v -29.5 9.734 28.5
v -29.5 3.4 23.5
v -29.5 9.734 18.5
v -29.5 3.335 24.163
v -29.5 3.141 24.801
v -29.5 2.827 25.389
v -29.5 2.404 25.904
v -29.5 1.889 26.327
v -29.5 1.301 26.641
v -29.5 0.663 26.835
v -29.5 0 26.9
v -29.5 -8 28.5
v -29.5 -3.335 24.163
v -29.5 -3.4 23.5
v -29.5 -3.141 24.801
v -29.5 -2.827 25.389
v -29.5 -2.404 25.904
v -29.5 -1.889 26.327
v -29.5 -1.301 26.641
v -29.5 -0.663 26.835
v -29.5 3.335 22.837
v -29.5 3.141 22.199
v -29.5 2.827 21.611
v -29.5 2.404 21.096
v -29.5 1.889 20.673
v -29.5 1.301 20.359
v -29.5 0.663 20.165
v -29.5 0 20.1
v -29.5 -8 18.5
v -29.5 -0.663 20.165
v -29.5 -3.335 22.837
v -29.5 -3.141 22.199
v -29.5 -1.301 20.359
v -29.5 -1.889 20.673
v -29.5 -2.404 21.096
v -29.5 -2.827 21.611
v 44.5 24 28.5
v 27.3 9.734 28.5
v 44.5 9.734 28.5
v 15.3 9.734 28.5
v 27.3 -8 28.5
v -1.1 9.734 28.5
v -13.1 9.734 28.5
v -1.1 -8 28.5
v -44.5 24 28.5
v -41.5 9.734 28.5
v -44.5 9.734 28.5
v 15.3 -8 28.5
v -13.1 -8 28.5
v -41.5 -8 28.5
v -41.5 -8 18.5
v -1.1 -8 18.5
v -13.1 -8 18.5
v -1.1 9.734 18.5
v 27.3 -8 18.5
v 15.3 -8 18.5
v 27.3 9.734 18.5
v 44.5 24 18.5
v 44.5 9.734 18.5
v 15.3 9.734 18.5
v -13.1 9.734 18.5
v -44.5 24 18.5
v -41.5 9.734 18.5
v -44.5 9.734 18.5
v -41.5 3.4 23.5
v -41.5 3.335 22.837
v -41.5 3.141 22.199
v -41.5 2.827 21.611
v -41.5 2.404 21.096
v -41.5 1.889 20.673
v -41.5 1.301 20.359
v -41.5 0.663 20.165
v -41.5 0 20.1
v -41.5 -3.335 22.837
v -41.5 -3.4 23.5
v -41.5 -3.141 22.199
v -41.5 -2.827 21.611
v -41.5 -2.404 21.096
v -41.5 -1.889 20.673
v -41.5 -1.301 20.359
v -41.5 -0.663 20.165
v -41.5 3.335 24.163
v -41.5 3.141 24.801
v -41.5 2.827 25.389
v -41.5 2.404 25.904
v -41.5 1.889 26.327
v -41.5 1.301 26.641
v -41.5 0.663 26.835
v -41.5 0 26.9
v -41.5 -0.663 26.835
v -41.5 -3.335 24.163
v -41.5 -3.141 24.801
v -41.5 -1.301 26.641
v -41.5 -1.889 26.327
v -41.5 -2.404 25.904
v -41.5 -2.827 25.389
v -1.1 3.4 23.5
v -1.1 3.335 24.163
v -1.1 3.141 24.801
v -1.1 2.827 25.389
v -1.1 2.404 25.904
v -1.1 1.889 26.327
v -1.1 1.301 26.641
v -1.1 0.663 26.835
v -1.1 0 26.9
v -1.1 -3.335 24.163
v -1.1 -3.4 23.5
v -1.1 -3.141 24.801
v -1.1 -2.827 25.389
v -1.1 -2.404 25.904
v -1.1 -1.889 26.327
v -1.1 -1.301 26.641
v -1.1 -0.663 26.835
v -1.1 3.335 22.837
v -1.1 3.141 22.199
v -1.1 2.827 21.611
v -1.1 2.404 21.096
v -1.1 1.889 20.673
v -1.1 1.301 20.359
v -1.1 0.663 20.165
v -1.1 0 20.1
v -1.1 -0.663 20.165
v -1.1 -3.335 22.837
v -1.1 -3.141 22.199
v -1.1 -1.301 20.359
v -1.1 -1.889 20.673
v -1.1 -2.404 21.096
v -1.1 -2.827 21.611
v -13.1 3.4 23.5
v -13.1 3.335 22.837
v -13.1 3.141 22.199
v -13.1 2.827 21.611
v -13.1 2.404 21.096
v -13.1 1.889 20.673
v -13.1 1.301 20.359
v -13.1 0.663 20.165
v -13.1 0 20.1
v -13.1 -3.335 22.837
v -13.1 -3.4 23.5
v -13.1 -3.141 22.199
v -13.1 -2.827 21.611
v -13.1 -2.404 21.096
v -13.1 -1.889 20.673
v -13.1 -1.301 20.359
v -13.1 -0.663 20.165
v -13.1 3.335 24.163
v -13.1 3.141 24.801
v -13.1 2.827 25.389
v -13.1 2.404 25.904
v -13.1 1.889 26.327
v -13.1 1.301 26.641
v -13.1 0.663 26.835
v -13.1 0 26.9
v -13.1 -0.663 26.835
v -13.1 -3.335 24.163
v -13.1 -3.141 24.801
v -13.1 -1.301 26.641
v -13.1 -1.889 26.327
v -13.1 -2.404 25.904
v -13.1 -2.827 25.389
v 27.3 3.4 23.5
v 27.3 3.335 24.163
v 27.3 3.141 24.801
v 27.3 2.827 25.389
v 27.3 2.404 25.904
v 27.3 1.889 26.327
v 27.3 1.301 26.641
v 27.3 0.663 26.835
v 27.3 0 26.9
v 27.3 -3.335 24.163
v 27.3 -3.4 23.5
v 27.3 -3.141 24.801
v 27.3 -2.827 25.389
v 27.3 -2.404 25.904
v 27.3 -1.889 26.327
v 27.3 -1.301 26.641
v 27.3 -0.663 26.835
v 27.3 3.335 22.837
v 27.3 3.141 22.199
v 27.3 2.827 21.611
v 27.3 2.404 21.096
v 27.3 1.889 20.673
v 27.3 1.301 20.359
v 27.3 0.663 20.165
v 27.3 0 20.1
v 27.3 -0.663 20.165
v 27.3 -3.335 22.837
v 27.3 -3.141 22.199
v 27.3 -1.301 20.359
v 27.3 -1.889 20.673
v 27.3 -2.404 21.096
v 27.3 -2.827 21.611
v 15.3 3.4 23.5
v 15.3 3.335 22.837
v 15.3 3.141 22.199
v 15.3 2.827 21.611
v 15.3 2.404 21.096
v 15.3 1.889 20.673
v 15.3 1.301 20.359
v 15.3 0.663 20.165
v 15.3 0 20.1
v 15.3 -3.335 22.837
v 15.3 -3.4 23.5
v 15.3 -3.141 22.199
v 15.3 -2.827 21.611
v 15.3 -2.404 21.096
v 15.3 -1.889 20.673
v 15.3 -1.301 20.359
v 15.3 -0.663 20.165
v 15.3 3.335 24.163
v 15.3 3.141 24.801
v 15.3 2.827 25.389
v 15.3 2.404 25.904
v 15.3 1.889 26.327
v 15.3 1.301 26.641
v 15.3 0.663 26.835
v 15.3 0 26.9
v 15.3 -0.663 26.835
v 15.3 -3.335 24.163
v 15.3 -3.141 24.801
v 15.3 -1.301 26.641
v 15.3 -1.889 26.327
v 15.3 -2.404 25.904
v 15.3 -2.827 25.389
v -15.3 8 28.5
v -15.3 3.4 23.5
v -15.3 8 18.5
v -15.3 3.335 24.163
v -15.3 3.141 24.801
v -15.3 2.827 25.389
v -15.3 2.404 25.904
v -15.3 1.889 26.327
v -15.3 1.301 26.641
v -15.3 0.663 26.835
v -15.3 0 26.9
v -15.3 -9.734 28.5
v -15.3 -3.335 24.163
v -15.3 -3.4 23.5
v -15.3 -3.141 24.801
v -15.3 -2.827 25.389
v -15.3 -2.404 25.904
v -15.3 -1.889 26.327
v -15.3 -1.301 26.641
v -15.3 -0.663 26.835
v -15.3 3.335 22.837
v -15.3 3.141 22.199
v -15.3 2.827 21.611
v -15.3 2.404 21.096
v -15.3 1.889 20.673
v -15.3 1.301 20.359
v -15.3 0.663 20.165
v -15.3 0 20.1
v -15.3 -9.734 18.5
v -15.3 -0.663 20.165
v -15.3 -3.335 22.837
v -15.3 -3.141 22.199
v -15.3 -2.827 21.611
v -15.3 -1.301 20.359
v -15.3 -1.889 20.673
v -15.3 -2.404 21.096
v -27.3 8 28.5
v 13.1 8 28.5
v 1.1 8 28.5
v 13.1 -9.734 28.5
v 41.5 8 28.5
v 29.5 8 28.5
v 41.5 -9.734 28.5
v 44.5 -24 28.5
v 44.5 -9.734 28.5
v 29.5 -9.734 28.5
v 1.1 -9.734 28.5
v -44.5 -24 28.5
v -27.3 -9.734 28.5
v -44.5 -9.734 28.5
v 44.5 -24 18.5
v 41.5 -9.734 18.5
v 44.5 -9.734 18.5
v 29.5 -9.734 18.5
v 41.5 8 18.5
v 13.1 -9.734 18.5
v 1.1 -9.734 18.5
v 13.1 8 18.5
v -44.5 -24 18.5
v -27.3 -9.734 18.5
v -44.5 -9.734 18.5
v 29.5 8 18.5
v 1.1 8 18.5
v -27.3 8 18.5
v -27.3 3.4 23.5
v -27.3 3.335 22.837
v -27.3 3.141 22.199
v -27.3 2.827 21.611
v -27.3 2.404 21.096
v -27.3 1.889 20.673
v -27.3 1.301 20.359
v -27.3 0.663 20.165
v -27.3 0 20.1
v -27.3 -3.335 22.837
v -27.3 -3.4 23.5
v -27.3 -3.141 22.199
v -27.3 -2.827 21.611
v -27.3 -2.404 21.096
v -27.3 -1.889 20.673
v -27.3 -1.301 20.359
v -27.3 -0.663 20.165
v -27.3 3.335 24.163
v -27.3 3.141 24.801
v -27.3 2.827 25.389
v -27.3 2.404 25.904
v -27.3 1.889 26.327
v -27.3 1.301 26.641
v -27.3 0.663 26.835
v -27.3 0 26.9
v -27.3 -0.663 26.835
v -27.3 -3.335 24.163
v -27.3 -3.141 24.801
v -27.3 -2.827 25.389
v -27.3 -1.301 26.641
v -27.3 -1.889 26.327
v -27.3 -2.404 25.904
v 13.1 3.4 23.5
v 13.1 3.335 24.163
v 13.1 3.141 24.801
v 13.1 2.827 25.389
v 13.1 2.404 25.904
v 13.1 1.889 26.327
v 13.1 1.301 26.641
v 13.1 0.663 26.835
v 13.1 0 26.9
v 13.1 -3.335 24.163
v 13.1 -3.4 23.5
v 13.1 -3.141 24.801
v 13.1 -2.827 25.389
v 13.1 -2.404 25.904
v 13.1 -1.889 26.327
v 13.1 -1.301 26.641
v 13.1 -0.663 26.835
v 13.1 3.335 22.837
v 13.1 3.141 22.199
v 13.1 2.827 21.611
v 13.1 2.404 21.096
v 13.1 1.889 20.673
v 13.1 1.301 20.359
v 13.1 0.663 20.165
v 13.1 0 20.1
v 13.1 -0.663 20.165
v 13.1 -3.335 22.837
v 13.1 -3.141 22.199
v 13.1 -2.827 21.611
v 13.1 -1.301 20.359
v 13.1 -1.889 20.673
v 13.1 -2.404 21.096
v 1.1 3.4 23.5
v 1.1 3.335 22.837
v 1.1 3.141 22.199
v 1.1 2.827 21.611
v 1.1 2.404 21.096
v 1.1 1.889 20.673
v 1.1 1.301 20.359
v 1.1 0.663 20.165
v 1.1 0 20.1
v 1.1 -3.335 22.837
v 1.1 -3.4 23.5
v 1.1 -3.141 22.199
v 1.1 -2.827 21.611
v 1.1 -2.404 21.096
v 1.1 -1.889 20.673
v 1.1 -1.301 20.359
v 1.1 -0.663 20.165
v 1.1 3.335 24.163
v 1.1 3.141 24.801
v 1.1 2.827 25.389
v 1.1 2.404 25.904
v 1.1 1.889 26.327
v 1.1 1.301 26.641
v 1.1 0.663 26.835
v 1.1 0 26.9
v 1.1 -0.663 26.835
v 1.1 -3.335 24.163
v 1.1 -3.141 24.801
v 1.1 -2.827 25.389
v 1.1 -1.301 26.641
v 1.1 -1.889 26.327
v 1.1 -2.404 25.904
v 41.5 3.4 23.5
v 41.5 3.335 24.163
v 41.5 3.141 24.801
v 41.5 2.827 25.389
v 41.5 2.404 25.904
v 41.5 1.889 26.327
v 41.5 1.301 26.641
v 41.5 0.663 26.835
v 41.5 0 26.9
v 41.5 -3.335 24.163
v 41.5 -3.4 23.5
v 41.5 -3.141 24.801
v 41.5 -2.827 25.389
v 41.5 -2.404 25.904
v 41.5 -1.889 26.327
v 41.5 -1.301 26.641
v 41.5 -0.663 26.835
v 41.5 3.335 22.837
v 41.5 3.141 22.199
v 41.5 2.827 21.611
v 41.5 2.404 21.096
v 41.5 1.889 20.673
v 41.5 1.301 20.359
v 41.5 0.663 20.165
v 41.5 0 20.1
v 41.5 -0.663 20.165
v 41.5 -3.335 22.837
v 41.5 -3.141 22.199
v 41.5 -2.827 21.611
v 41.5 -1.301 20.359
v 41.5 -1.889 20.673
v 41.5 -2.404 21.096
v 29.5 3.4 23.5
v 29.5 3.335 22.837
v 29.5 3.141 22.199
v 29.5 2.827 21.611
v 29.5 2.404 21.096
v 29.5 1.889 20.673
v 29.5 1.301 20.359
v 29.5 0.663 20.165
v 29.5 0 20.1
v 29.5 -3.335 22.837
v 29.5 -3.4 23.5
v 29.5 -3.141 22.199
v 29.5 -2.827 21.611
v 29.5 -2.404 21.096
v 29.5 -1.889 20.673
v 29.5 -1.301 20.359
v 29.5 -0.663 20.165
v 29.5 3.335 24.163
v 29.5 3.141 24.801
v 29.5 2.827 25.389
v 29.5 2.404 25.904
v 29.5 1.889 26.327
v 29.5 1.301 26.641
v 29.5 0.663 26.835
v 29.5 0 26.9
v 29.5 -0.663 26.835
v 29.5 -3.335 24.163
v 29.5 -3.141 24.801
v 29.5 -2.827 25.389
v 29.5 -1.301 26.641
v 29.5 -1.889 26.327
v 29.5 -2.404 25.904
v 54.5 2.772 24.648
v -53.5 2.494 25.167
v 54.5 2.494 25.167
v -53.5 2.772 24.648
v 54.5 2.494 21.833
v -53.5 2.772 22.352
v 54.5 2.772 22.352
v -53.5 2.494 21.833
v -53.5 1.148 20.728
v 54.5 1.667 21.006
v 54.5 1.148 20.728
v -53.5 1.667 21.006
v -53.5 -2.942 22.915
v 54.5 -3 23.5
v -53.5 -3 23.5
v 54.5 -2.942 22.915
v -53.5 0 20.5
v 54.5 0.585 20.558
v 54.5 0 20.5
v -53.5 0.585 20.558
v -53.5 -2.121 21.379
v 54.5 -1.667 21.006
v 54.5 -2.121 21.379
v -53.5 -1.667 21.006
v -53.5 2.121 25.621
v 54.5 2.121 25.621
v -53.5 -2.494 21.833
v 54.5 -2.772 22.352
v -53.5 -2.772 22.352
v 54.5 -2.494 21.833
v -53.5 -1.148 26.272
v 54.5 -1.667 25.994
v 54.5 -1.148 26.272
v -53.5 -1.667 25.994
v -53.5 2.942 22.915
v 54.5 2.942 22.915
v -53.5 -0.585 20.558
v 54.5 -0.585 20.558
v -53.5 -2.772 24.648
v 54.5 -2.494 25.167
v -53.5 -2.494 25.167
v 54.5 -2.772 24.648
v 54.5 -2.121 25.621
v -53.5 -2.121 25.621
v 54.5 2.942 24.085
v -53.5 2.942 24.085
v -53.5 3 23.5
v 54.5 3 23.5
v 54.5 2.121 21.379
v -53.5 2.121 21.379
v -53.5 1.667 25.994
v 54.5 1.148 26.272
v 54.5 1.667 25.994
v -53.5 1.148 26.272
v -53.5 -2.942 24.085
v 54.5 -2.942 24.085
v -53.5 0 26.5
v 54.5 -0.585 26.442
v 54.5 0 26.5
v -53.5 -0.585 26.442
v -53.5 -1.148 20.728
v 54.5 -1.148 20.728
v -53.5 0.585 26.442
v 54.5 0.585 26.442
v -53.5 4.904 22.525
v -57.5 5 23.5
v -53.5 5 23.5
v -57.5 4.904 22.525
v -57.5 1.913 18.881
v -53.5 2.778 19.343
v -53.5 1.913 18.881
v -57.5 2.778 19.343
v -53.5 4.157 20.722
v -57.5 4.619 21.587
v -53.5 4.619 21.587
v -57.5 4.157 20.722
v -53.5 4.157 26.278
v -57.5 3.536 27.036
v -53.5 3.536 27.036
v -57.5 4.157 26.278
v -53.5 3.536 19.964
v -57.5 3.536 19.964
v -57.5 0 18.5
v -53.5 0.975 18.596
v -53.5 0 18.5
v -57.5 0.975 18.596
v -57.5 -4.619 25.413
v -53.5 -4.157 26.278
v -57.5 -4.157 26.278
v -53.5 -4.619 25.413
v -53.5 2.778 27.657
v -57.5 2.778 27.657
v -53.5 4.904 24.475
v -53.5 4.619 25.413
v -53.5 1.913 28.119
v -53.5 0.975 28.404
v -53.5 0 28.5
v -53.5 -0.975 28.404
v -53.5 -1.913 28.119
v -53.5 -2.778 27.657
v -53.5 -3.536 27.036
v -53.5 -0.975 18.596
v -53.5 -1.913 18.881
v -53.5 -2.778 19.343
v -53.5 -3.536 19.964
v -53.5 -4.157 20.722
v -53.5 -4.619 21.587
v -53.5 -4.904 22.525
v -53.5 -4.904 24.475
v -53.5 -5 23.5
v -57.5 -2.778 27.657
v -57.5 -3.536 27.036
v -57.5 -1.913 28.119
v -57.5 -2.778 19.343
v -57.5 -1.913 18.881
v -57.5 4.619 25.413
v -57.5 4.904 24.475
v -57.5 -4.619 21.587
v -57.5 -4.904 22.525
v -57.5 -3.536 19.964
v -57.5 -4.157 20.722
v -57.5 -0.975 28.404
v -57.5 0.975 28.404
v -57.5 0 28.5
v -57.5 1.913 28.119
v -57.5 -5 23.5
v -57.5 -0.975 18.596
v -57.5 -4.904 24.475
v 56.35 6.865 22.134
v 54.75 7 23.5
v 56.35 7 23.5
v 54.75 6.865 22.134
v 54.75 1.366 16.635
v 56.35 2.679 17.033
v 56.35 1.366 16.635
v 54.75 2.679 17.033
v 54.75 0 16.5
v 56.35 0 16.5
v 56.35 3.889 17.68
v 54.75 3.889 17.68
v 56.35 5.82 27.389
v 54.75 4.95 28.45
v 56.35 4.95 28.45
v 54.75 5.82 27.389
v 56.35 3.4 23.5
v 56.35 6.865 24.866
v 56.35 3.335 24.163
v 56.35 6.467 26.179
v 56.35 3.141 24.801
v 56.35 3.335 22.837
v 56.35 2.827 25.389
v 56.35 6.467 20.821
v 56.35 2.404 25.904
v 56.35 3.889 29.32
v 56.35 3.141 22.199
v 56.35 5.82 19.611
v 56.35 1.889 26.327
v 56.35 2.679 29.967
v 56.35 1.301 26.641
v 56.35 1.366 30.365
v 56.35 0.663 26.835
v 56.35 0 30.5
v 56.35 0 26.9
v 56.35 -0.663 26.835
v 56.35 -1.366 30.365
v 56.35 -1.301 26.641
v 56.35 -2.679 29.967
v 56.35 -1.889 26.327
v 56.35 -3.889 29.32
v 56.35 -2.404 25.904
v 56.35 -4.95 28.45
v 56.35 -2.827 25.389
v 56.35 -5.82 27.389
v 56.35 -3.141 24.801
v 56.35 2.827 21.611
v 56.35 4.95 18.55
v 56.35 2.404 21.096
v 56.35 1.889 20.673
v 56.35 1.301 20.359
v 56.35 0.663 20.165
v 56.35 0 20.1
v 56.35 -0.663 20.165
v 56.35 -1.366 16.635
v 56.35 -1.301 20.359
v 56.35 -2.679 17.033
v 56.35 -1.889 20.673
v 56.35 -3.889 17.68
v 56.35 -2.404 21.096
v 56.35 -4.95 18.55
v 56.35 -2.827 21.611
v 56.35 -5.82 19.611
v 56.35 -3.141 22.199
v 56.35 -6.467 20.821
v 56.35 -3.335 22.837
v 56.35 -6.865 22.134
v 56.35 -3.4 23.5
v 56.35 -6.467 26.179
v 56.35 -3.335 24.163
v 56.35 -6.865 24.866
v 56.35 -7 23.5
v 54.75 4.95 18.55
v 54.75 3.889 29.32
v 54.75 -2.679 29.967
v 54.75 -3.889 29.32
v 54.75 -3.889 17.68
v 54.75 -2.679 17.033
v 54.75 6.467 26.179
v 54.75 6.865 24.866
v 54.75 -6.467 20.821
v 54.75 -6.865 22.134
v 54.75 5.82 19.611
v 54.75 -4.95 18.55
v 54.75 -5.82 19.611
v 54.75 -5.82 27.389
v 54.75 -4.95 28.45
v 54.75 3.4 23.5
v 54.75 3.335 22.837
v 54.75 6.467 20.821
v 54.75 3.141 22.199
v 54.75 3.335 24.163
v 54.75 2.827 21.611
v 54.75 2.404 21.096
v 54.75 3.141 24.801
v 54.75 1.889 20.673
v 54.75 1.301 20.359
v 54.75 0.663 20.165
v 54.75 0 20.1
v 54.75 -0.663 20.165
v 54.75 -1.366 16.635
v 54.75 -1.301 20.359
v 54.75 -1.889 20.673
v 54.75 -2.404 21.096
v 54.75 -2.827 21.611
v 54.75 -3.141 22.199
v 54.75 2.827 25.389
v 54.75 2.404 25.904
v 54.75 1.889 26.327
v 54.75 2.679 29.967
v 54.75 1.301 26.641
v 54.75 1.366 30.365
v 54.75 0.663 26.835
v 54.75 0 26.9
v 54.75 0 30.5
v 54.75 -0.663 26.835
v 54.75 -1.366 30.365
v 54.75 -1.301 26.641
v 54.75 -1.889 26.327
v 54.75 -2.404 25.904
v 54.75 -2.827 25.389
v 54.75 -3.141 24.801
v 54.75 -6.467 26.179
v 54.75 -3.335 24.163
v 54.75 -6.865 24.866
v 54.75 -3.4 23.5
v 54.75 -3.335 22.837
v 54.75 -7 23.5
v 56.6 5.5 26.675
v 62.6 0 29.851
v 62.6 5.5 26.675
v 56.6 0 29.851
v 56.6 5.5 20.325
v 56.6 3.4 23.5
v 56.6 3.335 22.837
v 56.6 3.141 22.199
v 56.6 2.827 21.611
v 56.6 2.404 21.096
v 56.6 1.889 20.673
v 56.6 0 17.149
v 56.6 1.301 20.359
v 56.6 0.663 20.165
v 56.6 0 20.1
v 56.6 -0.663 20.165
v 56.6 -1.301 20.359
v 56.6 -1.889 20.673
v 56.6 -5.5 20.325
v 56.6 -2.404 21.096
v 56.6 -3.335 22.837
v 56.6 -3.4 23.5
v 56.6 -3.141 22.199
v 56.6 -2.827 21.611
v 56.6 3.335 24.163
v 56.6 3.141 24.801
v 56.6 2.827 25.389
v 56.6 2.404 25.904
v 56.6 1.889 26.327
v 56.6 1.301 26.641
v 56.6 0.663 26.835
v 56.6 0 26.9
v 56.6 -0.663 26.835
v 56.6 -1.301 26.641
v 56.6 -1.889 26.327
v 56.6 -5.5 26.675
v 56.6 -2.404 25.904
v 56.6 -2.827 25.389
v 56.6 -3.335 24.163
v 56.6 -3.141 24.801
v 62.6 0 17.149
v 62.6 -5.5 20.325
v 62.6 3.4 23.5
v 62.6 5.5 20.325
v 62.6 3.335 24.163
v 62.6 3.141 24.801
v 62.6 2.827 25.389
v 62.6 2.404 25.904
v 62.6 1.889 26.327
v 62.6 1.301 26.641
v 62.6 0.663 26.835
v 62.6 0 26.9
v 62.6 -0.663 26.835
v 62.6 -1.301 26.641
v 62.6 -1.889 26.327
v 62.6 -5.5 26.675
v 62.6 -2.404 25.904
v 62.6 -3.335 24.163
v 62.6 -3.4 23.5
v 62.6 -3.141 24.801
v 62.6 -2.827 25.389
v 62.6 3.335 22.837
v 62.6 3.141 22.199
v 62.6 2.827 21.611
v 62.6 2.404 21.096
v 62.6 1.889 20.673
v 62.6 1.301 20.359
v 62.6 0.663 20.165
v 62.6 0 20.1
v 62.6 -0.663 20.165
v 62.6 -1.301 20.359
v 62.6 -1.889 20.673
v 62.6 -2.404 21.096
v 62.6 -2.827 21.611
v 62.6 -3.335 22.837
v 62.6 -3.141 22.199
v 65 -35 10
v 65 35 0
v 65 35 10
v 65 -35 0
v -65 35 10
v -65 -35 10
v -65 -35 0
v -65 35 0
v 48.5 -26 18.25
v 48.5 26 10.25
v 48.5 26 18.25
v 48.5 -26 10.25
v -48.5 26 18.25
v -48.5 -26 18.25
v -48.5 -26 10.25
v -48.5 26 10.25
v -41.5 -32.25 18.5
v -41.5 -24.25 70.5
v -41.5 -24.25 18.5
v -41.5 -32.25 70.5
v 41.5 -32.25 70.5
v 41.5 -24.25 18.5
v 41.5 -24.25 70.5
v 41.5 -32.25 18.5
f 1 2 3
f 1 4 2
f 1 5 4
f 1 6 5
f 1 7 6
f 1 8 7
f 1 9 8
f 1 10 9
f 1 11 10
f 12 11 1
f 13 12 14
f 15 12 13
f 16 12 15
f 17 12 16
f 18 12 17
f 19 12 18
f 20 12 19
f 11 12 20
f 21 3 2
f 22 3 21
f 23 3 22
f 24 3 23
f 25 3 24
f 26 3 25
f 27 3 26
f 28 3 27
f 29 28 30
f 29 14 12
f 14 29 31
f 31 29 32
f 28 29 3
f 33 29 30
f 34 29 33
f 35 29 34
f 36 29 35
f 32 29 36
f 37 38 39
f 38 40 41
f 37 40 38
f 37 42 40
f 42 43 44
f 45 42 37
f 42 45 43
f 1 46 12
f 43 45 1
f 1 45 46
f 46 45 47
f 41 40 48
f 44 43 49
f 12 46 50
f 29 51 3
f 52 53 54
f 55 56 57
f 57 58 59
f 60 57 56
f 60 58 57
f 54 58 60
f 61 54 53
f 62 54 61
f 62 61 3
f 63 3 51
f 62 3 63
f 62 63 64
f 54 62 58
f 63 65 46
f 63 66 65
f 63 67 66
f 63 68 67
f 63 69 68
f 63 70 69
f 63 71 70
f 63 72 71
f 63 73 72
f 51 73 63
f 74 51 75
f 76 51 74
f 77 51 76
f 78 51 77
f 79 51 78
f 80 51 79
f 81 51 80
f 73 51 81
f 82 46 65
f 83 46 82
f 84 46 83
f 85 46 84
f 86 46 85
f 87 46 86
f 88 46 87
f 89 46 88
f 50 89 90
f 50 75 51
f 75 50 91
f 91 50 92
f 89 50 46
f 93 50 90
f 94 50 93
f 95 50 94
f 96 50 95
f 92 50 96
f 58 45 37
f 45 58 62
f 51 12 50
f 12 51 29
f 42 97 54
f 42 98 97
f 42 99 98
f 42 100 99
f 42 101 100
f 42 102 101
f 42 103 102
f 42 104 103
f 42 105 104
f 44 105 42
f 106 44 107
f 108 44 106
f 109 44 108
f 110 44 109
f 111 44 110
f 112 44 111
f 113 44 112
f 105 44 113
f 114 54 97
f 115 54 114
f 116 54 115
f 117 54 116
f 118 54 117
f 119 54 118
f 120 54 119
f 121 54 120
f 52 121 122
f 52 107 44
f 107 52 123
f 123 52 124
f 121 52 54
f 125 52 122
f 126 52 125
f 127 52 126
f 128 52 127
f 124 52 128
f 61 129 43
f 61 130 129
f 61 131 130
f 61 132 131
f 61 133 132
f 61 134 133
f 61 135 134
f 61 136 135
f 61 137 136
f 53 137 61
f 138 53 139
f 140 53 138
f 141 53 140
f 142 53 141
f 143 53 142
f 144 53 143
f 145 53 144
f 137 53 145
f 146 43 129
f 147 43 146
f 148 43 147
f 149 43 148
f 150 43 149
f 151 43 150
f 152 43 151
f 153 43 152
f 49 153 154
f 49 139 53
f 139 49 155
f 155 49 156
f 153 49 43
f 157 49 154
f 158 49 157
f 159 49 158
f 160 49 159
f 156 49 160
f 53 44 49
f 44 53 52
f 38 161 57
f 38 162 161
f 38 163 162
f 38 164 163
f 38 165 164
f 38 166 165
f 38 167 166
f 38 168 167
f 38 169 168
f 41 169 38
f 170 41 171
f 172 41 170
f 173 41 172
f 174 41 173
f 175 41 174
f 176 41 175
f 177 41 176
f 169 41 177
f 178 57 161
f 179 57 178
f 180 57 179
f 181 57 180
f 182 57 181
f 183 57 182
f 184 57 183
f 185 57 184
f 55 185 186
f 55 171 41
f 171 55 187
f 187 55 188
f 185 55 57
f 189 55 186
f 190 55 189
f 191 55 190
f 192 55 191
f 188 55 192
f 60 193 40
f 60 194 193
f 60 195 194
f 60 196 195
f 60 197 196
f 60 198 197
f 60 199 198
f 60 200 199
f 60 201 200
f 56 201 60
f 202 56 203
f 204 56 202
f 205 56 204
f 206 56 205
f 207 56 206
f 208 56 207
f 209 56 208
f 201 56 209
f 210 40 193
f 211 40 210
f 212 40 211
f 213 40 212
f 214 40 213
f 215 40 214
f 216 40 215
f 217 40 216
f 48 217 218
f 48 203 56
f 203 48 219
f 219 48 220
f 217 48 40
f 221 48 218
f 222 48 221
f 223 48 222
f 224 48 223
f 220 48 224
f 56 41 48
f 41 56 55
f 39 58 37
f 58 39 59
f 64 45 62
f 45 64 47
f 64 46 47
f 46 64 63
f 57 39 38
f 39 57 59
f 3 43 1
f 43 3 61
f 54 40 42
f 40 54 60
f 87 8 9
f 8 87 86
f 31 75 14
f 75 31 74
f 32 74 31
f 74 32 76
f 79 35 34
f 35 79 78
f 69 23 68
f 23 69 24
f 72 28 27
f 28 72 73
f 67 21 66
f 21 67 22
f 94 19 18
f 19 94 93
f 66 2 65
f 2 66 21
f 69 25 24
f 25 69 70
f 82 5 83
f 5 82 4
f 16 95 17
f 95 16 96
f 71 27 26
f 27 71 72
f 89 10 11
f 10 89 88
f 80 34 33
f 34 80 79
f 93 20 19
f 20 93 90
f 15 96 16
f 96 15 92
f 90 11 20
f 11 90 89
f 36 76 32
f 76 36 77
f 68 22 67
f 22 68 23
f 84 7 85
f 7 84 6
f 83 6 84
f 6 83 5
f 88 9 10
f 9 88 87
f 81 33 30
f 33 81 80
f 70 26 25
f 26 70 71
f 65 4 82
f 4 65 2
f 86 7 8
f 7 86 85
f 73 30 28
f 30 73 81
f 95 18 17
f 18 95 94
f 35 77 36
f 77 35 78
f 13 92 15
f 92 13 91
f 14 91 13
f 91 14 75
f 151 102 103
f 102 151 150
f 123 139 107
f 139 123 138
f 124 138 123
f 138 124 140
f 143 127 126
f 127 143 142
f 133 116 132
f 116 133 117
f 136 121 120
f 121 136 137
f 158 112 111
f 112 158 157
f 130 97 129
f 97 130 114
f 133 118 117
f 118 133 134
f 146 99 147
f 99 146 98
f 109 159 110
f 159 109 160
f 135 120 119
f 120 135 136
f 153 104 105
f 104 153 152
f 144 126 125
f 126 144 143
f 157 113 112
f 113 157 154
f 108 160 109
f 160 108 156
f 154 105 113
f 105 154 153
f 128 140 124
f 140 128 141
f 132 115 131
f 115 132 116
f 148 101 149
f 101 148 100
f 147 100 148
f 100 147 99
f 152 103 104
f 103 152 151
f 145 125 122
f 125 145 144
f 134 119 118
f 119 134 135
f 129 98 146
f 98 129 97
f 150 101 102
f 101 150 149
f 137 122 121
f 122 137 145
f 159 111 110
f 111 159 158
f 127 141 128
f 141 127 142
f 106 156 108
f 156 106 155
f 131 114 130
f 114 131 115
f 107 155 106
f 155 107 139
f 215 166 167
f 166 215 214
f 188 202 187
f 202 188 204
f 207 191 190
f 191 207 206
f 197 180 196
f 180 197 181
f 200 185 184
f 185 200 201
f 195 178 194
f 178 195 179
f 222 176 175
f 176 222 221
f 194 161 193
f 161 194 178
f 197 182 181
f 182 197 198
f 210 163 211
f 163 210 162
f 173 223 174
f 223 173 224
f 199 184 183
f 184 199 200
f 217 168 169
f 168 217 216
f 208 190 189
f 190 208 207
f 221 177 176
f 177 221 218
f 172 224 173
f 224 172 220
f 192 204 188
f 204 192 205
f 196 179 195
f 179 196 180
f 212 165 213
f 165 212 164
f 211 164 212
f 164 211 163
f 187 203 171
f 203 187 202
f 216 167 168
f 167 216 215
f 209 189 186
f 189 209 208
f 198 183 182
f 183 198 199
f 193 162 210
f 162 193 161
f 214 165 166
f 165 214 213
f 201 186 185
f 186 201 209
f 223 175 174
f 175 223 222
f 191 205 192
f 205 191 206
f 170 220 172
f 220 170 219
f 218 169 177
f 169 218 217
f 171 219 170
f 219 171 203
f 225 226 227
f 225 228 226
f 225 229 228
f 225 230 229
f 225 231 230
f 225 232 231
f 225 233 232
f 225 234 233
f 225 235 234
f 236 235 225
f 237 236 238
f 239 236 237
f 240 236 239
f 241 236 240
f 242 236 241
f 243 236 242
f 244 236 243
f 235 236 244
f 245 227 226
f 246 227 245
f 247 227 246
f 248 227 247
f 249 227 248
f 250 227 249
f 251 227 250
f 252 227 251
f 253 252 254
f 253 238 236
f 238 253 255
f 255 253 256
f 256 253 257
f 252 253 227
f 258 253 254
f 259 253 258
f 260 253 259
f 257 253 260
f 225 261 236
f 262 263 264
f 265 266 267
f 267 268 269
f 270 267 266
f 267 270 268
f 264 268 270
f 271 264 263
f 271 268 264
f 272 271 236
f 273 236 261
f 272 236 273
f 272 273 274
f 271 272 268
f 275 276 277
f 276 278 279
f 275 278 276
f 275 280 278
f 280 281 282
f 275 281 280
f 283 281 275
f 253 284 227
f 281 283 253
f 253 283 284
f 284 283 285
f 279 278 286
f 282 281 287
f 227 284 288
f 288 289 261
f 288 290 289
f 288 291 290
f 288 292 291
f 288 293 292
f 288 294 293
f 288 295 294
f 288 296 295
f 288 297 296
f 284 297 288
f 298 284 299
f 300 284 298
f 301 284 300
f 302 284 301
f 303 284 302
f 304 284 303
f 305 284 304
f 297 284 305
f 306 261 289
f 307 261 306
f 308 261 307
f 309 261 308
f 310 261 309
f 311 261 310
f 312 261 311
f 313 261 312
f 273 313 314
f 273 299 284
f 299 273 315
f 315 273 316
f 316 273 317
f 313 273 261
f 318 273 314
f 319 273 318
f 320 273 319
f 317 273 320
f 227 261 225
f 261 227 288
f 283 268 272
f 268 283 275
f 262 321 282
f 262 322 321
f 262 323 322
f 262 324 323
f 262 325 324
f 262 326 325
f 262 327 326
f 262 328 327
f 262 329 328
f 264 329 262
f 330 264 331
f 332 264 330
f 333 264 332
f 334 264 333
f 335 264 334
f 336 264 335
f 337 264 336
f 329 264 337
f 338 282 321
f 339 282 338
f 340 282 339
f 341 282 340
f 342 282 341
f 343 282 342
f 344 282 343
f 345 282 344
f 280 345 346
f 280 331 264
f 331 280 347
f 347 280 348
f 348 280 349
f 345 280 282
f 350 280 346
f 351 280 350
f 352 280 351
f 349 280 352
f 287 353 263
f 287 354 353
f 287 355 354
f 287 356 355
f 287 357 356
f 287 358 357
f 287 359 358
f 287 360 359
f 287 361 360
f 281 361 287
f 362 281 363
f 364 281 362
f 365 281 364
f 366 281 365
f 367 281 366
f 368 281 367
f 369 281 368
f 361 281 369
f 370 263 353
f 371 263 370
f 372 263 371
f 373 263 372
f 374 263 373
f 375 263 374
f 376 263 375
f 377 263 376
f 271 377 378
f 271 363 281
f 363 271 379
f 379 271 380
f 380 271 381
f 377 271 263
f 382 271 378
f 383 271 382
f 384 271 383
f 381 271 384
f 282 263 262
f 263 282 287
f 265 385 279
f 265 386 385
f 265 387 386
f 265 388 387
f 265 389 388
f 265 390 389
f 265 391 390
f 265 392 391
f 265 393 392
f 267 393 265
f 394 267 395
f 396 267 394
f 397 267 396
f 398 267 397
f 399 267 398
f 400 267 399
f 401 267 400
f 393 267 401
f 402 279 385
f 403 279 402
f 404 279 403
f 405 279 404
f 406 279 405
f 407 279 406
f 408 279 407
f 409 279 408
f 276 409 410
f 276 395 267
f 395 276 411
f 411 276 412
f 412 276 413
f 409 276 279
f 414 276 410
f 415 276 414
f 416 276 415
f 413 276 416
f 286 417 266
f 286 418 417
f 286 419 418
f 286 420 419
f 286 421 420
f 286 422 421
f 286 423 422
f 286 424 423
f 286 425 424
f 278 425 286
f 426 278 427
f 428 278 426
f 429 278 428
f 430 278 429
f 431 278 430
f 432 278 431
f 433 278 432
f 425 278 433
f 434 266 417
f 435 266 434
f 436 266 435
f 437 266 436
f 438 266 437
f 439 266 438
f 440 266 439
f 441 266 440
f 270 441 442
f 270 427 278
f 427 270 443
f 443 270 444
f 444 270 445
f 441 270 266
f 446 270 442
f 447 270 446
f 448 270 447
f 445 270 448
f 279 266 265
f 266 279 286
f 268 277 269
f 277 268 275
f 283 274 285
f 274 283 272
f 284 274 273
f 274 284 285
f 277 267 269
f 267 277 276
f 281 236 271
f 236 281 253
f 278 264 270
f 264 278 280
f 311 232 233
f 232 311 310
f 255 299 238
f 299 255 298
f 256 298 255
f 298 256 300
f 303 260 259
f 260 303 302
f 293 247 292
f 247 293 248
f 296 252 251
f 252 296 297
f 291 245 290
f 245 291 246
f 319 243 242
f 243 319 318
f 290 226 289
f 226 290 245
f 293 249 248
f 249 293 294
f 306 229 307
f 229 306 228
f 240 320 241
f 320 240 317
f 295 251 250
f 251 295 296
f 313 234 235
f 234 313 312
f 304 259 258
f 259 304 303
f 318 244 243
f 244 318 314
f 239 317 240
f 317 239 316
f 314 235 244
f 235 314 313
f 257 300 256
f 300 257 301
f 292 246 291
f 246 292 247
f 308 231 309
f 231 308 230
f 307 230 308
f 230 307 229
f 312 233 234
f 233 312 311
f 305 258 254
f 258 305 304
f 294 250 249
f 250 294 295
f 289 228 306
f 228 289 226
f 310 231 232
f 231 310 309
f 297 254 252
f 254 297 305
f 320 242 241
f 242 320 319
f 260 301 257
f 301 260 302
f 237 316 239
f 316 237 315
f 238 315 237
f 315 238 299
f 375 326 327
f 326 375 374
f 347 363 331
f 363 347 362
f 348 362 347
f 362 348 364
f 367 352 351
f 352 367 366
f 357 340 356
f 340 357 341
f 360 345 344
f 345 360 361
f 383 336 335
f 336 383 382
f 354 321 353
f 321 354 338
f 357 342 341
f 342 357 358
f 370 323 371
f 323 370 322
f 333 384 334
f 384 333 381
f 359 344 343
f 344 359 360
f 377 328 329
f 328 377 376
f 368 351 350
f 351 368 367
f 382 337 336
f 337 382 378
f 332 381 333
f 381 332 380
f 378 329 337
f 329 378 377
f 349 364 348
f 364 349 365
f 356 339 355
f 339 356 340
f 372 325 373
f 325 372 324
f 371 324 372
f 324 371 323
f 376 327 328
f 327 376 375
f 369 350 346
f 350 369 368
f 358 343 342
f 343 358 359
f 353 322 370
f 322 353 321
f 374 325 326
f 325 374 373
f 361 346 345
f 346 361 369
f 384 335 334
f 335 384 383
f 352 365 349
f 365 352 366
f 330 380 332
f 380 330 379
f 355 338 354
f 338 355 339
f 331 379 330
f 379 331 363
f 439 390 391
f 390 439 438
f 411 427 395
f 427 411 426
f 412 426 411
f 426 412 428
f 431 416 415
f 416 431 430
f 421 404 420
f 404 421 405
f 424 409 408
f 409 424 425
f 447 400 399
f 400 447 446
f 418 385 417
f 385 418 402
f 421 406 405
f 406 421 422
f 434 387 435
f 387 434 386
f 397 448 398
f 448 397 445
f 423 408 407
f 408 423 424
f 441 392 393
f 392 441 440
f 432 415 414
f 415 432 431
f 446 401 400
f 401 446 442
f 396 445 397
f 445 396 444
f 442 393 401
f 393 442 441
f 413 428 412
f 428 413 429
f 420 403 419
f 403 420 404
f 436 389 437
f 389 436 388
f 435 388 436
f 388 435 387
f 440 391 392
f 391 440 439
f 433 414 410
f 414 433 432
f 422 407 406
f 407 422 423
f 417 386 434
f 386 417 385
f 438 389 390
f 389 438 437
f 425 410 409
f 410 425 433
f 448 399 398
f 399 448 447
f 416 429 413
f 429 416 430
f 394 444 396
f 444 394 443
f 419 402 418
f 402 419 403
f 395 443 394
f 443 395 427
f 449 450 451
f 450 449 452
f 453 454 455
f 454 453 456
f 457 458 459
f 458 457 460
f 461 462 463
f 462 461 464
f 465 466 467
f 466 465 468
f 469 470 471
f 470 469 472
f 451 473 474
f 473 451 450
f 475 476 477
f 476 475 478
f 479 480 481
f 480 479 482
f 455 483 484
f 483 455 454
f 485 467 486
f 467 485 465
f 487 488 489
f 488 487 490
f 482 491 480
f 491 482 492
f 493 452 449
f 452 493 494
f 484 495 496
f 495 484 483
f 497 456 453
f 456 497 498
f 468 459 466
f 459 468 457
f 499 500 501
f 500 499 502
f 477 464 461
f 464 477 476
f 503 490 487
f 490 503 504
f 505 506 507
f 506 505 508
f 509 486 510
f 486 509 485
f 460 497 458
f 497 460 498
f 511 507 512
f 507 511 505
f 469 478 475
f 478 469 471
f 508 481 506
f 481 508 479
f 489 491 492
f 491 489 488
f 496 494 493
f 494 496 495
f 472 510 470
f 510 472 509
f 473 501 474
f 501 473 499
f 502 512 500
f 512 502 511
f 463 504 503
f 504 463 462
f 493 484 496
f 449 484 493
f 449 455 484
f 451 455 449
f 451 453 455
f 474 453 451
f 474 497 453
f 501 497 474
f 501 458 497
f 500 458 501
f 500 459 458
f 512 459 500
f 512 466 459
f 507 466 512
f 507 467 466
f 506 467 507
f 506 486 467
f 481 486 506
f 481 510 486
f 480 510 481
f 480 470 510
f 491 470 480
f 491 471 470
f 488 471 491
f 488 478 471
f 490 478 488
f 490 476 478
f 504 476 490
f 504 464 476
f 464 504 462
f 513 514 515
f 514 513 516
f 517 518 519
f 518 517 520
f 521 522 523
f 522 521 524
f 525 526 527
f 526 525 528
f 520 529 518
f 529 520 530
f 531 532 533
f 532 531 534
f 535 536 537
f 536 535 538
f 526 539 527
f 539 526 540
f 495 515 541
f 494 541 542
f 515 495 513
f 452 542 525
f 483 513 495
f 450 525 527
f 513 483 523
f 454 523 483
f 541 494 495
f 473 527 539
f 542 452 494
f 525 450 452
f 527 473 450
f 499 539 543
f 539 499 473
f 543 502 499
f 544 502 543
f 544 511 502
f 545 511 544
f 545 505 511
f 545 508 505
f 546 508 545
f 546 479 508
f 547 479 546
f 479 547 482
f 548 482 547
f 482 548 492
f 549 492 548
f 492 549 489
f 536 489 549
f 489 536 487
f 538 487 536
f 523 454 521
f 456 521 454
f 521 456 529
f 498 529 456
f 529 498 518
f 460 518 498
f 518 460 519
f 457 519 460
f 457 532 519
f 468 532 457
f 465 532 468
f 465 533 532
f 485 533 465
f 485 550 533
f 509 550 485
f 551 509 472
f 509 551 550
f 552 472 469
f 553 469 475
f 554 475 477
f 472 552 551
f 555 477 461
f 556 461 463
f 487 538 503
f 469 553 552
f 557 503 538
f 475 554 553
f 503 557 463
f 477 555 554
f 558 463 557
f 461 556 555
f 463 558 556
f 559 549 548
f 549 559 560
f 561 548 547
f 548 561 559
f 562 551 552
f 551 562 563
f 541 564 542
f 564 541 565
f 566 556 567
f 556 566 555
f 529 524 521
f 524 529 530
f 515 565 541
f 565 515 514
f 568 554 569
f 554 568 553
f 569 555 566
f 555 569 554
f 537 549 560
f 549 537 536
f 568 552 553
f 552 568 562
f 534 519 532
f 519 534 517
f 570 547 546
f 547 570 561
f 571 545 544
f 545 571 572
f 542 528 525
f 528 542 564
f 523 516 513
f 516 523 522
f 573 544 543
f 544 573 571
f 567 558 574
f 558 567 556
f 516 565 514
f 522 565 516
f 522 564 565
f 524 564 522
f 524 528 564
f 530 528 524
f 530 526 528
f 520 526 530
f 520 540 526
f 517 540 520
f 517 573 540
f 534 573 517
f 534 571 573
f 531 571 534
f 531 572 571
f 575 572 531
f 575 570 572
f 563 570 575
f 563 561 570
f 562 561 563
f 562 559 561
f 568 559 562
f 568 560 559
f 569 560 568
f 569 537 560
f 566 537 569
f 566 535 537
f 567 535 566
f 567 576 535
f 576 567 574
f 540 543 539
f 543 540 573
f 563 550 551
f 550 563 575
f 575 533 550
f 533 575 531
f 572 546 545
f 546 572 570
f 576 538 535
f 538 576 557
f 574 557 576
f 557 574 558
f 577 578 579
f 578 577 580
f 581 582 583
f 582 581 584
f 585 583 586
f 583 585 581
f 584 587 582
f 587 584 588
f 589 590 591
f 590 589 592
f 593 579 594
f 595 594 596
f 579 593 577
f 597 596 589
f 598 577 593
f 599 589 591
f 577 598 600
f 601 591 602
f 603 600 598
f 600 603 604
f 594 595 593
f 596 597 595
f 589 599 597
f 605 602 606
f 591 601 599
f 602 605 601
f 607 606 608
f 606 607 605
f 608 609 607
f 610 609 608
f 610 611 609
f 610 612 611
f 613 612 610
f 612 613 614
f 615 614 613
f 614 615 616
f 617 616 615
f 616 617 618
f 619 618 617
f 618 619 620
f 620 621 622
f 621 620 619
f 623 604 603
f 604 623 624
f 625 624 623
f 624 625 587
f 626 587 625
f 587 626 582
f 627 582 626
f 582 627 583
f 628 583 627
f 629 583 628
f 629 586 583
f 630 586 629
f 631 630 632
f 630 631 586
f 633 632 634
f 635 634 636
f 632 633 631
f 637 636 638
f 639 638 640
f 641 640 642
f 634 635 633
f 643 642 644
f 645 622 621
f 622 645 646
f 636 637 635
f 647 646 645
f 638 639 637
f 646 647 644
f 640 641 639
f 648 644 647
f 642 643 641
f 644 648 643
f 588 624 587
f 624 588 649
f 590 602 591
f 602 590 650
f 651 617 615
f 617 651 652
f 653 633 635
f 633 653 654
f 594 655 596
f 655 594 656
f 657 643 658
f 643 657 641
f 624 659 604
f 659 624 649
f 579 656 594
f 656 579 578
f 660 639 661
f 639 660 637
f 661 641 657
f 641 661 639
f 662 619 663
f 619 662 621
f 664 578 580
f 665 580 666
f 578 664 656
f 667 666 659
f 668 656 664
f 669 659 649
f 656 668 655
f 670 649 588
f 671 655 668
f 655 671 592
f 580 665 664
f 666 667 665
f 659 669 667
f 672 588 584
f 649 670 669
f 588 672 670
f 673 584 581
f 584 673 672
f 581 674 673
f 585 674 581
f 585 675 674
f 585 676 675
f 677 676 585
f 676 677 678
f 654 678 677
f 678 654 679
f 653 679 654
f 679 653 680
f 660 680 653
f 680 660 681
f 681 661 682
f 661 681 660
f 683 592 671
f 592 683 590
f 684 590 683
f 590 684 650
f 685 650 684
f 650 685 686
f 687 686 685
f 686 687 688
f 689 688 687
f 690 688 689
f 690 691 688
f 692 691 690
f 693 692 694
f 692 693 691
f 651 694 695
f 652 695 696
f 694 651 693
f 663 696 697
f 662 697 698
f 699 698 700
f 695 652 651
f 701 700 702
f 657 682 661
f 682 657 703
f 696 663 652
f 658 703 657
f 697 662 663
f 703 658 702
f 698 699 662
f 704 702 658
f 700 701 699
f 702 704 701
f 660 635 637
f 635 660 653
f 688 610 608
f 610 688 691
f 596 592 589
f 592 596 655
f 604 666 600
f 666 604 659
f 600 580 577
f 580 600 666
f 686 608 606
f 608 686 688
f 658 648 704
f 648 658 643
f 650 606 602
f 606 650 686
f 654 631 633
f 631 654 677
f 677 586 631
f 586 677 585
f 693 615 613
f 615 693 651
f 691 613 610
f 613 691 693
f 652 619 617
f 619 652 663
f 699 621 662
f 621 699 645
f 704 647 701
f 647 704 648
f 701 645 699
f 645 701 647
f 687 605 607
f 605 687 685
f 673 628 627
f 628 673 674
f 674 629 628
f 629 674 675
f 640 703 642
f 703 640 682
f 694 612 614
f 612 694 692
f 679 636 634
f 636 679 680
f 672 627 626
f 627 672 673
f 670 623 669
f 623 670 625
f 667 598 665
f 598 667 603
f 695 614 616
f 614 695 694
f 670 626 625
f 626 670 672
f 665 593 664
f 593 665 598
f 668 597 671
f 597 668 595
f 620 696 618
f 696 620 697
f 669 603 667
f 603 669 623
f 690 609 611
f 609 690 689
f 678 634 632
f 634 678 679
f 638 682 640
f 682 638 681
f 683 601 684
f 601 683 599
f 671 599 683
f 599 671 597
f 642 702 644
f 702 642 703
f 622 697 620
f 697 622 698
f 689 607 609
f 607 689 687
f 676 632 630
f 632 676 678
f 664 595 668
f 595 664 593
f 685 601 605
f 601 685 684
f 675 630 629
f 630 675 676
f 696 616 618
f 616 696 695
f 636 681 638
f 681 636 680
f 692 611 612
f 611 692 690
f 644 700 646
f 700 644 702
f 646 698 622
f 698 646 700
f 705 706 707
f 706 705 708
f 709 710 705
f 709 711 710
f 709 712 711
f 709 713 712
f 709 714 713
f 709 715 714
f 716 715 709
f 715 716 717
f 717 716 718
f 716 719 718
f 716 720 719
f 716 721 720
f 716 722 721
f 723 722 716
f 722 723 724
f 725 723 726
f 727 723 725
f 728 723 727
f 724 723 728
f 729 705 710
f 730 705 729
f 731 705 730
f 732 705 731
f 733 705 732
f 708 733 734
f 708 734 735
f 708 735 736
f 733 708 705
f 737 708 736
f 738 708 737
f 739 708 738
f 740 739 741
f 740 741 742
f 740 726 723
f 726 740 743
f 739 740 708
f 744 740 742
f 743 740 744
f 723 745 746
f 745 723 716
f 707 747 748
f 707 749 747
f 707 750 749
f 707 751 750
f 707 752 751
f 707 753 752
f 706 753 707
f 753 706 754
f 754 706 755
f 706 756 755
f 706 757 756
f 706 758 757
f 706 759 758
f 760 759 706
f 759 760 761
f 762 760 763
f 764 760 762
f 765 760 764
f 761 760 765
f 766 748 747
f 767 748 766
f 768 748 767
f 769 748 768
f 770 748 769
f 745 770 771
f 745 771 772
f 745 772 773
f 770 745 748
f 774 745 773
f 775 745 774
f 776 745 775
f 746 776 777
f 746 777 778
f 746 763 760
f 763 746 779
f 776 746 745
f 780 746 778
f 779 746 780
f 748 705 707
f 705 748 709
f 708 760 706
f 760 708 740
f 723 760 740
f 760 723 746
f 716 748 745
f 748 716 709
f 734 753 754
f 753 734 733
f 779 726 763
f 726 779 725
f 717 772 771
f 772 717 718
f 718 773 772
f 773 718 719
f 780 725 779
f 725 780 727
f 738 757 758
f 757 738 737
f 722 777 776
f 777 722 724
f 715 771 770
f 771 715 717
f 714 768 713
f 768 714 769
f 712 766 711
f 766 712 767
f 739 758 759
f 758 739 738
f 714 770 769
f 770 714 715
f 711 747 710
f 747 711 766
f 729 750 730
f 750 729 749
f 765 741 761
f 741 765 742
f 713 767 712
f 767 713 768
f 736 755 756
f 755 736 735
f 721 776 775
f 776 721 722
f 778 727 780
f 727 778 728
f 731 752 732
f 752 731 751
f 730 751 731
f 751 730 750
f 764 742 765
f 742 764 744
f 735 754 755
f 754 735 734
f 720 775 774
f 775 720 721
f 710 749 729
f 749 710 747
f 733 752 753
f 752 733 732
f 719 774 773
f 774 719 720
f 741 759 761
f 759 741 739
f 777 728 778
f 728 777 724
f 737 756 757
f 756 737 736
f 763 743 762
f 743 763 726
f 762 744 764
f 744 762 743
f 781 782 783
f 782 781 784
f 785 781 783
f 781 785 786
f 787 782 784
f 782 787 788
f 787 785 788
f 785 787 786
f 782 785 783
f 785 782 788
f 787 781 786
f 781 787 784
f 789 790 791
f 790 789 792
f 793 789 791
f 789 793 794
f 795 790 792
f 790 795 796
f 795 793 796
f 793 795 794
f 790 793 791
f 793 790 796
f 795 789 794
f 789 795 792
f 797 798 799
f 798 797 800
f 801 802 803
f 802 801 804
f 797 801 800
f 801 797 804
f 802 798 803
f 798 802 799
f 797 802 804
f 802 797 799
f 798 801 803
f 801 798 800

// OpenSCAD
$fn = 32;

// ------------------------------------------------------------------------
// Comb hinge with flap: leaf 89 x 24 mm, pin d6, flap 52 mm
// Every part is its own module, assembly() places every instance.
// ------------------------------------------------------------------------

// --- part 1 ---
module hinge_bed() {
  difference() {
    translate([-65, -35, 0]) cube([130, 70, 10]);
  }
}

// --- part 2 ---
module hinge_riser() {
  difference() {
    translate([-48.5, -26, 0]) cube([97, 52, 8]);
  }
}

// --- part 3 ---
module hinge_leaf_a() {
  difference() {
    union() {
      translate([-41.5, -8, -5]) cube([12, 32, 10]);
      translate([-13.1, -8, -5]) cube([12, 32, 10]);
      translate([15.3, -8, -5]) cube([12, 32, 10]);
      translate([-44.5, 9.734, -5]) cube([89, 14.266, 10]);
    }
    translate([-35.5, 0, 0]) rotate([0, 90, 0]) cylinder(h = 14, d = 6.8, center = true);
    translate([-7.1, 0, 0]) rotate([0, 90, 0]) cylinder(h = 14, d = 6.8, center = true);
    translate([21.3, 0, 0]) rotate([0, 90, 0]) cylinder(h = 14, d = 6.8, center = true);
  }
}

// --- part 4 ---
module hinge_leaf_b() {
  difference() {
    union() {
      translate([-27.3, -24, -5]) cube([12, 32, 10]);
      translate([1.1, -24, -5]) cube([12, 32, 10]);
      translate([29.5, -24, -5]) cube([12, 32, 10]);
      translate([-44.5, -24, -5]) cube([89, 14.266, 10]);
    }
    translate([-21.3, 0, 0]) rotate([0, 90, 0]) cylinder(h = 14, d = 6.8, center = true);
    translate([7.1, 0, 0]) rotate([0, 90, 0]) cylinder(h = 14, d = 6.8, center = true);
    translate([35.5, 0, 0]) rotate([0, 90, 0]) cylinder(h = 14, d = 6.8, center = true);
  }
}

// --- part 5 ---
module hinge_flap() {
  difference() {
    translate([-41.5, -26, 0]) cube([83, 52, 8]);
  }
}

// --- part 6 ---
module hinge_pin() {
  rotate([0, 90, 0]) cylinder(h = 109, d = 6, center = true);
  translate([-57.5, 0, 0]) rotate([0, 90, 0]) cylinder(h = 4, d = 10);
}

// --- part 7 ---
module pin_washer() {
  difference() {
      translate([0, 0, 0]) cylinder(h = 1.6, d = 14);
      translate([0, 0, -1]) cylinder(h = 3.6, d = 6.8);
    }
}

// --- part 8 ---
module pin_nut() {
  difference() {
    linear_extrude(height = 6) polygon(points = [[6.351, 0], [3.175, 5.5], [-3.175, 5.5], [-6.351, 0], [-3.175, -5.5], [3.175, -5.5]]);
    translate([0, 0, -1]) cylinder(h = 8, d = 6.8);
  }
}

// --- assembly ---
module assembly() {
  color([0.80, 0.24, 0.20]) translate([0, 0, 0]) rotate([0, 0, 0]) hinge_bed();
  color([0.20, 0.45, 0.75]) translate([0, 0, 10.25]) rotate([0, 0, 0]) hinge_riser();
  color([0.25, 0.62, 0.32]) translate([0, 0, 23.5]) rotate([0, 0, 0]) hinge_leaf_a();
  color([0.92, 0.70, 0.18]) translate([0, 0, 23.5]) rotate([0, 0, 0]) hinge_leaf_b();
  color([0.58, 0.35, 0.70]) translate([0, -24.25, 44.5]) rotate([90, 0, 0]) hinge_flap();
  color([0.16, 0.66, 0.66]) translate([0, 0, 23.5]) rotate([0, 0, 0]) hinge_pin();
  color([0.85, 0.48, 0.18]) translate([54.75, 0, 23.5]) rotate([0, 90, 0]) pin_washer();
  color([0.55, 0.60, 0.65]) translate([56.6, 0, 23.5]) rotate([0, 90, 0]) pin_nut();
}

assembly();
